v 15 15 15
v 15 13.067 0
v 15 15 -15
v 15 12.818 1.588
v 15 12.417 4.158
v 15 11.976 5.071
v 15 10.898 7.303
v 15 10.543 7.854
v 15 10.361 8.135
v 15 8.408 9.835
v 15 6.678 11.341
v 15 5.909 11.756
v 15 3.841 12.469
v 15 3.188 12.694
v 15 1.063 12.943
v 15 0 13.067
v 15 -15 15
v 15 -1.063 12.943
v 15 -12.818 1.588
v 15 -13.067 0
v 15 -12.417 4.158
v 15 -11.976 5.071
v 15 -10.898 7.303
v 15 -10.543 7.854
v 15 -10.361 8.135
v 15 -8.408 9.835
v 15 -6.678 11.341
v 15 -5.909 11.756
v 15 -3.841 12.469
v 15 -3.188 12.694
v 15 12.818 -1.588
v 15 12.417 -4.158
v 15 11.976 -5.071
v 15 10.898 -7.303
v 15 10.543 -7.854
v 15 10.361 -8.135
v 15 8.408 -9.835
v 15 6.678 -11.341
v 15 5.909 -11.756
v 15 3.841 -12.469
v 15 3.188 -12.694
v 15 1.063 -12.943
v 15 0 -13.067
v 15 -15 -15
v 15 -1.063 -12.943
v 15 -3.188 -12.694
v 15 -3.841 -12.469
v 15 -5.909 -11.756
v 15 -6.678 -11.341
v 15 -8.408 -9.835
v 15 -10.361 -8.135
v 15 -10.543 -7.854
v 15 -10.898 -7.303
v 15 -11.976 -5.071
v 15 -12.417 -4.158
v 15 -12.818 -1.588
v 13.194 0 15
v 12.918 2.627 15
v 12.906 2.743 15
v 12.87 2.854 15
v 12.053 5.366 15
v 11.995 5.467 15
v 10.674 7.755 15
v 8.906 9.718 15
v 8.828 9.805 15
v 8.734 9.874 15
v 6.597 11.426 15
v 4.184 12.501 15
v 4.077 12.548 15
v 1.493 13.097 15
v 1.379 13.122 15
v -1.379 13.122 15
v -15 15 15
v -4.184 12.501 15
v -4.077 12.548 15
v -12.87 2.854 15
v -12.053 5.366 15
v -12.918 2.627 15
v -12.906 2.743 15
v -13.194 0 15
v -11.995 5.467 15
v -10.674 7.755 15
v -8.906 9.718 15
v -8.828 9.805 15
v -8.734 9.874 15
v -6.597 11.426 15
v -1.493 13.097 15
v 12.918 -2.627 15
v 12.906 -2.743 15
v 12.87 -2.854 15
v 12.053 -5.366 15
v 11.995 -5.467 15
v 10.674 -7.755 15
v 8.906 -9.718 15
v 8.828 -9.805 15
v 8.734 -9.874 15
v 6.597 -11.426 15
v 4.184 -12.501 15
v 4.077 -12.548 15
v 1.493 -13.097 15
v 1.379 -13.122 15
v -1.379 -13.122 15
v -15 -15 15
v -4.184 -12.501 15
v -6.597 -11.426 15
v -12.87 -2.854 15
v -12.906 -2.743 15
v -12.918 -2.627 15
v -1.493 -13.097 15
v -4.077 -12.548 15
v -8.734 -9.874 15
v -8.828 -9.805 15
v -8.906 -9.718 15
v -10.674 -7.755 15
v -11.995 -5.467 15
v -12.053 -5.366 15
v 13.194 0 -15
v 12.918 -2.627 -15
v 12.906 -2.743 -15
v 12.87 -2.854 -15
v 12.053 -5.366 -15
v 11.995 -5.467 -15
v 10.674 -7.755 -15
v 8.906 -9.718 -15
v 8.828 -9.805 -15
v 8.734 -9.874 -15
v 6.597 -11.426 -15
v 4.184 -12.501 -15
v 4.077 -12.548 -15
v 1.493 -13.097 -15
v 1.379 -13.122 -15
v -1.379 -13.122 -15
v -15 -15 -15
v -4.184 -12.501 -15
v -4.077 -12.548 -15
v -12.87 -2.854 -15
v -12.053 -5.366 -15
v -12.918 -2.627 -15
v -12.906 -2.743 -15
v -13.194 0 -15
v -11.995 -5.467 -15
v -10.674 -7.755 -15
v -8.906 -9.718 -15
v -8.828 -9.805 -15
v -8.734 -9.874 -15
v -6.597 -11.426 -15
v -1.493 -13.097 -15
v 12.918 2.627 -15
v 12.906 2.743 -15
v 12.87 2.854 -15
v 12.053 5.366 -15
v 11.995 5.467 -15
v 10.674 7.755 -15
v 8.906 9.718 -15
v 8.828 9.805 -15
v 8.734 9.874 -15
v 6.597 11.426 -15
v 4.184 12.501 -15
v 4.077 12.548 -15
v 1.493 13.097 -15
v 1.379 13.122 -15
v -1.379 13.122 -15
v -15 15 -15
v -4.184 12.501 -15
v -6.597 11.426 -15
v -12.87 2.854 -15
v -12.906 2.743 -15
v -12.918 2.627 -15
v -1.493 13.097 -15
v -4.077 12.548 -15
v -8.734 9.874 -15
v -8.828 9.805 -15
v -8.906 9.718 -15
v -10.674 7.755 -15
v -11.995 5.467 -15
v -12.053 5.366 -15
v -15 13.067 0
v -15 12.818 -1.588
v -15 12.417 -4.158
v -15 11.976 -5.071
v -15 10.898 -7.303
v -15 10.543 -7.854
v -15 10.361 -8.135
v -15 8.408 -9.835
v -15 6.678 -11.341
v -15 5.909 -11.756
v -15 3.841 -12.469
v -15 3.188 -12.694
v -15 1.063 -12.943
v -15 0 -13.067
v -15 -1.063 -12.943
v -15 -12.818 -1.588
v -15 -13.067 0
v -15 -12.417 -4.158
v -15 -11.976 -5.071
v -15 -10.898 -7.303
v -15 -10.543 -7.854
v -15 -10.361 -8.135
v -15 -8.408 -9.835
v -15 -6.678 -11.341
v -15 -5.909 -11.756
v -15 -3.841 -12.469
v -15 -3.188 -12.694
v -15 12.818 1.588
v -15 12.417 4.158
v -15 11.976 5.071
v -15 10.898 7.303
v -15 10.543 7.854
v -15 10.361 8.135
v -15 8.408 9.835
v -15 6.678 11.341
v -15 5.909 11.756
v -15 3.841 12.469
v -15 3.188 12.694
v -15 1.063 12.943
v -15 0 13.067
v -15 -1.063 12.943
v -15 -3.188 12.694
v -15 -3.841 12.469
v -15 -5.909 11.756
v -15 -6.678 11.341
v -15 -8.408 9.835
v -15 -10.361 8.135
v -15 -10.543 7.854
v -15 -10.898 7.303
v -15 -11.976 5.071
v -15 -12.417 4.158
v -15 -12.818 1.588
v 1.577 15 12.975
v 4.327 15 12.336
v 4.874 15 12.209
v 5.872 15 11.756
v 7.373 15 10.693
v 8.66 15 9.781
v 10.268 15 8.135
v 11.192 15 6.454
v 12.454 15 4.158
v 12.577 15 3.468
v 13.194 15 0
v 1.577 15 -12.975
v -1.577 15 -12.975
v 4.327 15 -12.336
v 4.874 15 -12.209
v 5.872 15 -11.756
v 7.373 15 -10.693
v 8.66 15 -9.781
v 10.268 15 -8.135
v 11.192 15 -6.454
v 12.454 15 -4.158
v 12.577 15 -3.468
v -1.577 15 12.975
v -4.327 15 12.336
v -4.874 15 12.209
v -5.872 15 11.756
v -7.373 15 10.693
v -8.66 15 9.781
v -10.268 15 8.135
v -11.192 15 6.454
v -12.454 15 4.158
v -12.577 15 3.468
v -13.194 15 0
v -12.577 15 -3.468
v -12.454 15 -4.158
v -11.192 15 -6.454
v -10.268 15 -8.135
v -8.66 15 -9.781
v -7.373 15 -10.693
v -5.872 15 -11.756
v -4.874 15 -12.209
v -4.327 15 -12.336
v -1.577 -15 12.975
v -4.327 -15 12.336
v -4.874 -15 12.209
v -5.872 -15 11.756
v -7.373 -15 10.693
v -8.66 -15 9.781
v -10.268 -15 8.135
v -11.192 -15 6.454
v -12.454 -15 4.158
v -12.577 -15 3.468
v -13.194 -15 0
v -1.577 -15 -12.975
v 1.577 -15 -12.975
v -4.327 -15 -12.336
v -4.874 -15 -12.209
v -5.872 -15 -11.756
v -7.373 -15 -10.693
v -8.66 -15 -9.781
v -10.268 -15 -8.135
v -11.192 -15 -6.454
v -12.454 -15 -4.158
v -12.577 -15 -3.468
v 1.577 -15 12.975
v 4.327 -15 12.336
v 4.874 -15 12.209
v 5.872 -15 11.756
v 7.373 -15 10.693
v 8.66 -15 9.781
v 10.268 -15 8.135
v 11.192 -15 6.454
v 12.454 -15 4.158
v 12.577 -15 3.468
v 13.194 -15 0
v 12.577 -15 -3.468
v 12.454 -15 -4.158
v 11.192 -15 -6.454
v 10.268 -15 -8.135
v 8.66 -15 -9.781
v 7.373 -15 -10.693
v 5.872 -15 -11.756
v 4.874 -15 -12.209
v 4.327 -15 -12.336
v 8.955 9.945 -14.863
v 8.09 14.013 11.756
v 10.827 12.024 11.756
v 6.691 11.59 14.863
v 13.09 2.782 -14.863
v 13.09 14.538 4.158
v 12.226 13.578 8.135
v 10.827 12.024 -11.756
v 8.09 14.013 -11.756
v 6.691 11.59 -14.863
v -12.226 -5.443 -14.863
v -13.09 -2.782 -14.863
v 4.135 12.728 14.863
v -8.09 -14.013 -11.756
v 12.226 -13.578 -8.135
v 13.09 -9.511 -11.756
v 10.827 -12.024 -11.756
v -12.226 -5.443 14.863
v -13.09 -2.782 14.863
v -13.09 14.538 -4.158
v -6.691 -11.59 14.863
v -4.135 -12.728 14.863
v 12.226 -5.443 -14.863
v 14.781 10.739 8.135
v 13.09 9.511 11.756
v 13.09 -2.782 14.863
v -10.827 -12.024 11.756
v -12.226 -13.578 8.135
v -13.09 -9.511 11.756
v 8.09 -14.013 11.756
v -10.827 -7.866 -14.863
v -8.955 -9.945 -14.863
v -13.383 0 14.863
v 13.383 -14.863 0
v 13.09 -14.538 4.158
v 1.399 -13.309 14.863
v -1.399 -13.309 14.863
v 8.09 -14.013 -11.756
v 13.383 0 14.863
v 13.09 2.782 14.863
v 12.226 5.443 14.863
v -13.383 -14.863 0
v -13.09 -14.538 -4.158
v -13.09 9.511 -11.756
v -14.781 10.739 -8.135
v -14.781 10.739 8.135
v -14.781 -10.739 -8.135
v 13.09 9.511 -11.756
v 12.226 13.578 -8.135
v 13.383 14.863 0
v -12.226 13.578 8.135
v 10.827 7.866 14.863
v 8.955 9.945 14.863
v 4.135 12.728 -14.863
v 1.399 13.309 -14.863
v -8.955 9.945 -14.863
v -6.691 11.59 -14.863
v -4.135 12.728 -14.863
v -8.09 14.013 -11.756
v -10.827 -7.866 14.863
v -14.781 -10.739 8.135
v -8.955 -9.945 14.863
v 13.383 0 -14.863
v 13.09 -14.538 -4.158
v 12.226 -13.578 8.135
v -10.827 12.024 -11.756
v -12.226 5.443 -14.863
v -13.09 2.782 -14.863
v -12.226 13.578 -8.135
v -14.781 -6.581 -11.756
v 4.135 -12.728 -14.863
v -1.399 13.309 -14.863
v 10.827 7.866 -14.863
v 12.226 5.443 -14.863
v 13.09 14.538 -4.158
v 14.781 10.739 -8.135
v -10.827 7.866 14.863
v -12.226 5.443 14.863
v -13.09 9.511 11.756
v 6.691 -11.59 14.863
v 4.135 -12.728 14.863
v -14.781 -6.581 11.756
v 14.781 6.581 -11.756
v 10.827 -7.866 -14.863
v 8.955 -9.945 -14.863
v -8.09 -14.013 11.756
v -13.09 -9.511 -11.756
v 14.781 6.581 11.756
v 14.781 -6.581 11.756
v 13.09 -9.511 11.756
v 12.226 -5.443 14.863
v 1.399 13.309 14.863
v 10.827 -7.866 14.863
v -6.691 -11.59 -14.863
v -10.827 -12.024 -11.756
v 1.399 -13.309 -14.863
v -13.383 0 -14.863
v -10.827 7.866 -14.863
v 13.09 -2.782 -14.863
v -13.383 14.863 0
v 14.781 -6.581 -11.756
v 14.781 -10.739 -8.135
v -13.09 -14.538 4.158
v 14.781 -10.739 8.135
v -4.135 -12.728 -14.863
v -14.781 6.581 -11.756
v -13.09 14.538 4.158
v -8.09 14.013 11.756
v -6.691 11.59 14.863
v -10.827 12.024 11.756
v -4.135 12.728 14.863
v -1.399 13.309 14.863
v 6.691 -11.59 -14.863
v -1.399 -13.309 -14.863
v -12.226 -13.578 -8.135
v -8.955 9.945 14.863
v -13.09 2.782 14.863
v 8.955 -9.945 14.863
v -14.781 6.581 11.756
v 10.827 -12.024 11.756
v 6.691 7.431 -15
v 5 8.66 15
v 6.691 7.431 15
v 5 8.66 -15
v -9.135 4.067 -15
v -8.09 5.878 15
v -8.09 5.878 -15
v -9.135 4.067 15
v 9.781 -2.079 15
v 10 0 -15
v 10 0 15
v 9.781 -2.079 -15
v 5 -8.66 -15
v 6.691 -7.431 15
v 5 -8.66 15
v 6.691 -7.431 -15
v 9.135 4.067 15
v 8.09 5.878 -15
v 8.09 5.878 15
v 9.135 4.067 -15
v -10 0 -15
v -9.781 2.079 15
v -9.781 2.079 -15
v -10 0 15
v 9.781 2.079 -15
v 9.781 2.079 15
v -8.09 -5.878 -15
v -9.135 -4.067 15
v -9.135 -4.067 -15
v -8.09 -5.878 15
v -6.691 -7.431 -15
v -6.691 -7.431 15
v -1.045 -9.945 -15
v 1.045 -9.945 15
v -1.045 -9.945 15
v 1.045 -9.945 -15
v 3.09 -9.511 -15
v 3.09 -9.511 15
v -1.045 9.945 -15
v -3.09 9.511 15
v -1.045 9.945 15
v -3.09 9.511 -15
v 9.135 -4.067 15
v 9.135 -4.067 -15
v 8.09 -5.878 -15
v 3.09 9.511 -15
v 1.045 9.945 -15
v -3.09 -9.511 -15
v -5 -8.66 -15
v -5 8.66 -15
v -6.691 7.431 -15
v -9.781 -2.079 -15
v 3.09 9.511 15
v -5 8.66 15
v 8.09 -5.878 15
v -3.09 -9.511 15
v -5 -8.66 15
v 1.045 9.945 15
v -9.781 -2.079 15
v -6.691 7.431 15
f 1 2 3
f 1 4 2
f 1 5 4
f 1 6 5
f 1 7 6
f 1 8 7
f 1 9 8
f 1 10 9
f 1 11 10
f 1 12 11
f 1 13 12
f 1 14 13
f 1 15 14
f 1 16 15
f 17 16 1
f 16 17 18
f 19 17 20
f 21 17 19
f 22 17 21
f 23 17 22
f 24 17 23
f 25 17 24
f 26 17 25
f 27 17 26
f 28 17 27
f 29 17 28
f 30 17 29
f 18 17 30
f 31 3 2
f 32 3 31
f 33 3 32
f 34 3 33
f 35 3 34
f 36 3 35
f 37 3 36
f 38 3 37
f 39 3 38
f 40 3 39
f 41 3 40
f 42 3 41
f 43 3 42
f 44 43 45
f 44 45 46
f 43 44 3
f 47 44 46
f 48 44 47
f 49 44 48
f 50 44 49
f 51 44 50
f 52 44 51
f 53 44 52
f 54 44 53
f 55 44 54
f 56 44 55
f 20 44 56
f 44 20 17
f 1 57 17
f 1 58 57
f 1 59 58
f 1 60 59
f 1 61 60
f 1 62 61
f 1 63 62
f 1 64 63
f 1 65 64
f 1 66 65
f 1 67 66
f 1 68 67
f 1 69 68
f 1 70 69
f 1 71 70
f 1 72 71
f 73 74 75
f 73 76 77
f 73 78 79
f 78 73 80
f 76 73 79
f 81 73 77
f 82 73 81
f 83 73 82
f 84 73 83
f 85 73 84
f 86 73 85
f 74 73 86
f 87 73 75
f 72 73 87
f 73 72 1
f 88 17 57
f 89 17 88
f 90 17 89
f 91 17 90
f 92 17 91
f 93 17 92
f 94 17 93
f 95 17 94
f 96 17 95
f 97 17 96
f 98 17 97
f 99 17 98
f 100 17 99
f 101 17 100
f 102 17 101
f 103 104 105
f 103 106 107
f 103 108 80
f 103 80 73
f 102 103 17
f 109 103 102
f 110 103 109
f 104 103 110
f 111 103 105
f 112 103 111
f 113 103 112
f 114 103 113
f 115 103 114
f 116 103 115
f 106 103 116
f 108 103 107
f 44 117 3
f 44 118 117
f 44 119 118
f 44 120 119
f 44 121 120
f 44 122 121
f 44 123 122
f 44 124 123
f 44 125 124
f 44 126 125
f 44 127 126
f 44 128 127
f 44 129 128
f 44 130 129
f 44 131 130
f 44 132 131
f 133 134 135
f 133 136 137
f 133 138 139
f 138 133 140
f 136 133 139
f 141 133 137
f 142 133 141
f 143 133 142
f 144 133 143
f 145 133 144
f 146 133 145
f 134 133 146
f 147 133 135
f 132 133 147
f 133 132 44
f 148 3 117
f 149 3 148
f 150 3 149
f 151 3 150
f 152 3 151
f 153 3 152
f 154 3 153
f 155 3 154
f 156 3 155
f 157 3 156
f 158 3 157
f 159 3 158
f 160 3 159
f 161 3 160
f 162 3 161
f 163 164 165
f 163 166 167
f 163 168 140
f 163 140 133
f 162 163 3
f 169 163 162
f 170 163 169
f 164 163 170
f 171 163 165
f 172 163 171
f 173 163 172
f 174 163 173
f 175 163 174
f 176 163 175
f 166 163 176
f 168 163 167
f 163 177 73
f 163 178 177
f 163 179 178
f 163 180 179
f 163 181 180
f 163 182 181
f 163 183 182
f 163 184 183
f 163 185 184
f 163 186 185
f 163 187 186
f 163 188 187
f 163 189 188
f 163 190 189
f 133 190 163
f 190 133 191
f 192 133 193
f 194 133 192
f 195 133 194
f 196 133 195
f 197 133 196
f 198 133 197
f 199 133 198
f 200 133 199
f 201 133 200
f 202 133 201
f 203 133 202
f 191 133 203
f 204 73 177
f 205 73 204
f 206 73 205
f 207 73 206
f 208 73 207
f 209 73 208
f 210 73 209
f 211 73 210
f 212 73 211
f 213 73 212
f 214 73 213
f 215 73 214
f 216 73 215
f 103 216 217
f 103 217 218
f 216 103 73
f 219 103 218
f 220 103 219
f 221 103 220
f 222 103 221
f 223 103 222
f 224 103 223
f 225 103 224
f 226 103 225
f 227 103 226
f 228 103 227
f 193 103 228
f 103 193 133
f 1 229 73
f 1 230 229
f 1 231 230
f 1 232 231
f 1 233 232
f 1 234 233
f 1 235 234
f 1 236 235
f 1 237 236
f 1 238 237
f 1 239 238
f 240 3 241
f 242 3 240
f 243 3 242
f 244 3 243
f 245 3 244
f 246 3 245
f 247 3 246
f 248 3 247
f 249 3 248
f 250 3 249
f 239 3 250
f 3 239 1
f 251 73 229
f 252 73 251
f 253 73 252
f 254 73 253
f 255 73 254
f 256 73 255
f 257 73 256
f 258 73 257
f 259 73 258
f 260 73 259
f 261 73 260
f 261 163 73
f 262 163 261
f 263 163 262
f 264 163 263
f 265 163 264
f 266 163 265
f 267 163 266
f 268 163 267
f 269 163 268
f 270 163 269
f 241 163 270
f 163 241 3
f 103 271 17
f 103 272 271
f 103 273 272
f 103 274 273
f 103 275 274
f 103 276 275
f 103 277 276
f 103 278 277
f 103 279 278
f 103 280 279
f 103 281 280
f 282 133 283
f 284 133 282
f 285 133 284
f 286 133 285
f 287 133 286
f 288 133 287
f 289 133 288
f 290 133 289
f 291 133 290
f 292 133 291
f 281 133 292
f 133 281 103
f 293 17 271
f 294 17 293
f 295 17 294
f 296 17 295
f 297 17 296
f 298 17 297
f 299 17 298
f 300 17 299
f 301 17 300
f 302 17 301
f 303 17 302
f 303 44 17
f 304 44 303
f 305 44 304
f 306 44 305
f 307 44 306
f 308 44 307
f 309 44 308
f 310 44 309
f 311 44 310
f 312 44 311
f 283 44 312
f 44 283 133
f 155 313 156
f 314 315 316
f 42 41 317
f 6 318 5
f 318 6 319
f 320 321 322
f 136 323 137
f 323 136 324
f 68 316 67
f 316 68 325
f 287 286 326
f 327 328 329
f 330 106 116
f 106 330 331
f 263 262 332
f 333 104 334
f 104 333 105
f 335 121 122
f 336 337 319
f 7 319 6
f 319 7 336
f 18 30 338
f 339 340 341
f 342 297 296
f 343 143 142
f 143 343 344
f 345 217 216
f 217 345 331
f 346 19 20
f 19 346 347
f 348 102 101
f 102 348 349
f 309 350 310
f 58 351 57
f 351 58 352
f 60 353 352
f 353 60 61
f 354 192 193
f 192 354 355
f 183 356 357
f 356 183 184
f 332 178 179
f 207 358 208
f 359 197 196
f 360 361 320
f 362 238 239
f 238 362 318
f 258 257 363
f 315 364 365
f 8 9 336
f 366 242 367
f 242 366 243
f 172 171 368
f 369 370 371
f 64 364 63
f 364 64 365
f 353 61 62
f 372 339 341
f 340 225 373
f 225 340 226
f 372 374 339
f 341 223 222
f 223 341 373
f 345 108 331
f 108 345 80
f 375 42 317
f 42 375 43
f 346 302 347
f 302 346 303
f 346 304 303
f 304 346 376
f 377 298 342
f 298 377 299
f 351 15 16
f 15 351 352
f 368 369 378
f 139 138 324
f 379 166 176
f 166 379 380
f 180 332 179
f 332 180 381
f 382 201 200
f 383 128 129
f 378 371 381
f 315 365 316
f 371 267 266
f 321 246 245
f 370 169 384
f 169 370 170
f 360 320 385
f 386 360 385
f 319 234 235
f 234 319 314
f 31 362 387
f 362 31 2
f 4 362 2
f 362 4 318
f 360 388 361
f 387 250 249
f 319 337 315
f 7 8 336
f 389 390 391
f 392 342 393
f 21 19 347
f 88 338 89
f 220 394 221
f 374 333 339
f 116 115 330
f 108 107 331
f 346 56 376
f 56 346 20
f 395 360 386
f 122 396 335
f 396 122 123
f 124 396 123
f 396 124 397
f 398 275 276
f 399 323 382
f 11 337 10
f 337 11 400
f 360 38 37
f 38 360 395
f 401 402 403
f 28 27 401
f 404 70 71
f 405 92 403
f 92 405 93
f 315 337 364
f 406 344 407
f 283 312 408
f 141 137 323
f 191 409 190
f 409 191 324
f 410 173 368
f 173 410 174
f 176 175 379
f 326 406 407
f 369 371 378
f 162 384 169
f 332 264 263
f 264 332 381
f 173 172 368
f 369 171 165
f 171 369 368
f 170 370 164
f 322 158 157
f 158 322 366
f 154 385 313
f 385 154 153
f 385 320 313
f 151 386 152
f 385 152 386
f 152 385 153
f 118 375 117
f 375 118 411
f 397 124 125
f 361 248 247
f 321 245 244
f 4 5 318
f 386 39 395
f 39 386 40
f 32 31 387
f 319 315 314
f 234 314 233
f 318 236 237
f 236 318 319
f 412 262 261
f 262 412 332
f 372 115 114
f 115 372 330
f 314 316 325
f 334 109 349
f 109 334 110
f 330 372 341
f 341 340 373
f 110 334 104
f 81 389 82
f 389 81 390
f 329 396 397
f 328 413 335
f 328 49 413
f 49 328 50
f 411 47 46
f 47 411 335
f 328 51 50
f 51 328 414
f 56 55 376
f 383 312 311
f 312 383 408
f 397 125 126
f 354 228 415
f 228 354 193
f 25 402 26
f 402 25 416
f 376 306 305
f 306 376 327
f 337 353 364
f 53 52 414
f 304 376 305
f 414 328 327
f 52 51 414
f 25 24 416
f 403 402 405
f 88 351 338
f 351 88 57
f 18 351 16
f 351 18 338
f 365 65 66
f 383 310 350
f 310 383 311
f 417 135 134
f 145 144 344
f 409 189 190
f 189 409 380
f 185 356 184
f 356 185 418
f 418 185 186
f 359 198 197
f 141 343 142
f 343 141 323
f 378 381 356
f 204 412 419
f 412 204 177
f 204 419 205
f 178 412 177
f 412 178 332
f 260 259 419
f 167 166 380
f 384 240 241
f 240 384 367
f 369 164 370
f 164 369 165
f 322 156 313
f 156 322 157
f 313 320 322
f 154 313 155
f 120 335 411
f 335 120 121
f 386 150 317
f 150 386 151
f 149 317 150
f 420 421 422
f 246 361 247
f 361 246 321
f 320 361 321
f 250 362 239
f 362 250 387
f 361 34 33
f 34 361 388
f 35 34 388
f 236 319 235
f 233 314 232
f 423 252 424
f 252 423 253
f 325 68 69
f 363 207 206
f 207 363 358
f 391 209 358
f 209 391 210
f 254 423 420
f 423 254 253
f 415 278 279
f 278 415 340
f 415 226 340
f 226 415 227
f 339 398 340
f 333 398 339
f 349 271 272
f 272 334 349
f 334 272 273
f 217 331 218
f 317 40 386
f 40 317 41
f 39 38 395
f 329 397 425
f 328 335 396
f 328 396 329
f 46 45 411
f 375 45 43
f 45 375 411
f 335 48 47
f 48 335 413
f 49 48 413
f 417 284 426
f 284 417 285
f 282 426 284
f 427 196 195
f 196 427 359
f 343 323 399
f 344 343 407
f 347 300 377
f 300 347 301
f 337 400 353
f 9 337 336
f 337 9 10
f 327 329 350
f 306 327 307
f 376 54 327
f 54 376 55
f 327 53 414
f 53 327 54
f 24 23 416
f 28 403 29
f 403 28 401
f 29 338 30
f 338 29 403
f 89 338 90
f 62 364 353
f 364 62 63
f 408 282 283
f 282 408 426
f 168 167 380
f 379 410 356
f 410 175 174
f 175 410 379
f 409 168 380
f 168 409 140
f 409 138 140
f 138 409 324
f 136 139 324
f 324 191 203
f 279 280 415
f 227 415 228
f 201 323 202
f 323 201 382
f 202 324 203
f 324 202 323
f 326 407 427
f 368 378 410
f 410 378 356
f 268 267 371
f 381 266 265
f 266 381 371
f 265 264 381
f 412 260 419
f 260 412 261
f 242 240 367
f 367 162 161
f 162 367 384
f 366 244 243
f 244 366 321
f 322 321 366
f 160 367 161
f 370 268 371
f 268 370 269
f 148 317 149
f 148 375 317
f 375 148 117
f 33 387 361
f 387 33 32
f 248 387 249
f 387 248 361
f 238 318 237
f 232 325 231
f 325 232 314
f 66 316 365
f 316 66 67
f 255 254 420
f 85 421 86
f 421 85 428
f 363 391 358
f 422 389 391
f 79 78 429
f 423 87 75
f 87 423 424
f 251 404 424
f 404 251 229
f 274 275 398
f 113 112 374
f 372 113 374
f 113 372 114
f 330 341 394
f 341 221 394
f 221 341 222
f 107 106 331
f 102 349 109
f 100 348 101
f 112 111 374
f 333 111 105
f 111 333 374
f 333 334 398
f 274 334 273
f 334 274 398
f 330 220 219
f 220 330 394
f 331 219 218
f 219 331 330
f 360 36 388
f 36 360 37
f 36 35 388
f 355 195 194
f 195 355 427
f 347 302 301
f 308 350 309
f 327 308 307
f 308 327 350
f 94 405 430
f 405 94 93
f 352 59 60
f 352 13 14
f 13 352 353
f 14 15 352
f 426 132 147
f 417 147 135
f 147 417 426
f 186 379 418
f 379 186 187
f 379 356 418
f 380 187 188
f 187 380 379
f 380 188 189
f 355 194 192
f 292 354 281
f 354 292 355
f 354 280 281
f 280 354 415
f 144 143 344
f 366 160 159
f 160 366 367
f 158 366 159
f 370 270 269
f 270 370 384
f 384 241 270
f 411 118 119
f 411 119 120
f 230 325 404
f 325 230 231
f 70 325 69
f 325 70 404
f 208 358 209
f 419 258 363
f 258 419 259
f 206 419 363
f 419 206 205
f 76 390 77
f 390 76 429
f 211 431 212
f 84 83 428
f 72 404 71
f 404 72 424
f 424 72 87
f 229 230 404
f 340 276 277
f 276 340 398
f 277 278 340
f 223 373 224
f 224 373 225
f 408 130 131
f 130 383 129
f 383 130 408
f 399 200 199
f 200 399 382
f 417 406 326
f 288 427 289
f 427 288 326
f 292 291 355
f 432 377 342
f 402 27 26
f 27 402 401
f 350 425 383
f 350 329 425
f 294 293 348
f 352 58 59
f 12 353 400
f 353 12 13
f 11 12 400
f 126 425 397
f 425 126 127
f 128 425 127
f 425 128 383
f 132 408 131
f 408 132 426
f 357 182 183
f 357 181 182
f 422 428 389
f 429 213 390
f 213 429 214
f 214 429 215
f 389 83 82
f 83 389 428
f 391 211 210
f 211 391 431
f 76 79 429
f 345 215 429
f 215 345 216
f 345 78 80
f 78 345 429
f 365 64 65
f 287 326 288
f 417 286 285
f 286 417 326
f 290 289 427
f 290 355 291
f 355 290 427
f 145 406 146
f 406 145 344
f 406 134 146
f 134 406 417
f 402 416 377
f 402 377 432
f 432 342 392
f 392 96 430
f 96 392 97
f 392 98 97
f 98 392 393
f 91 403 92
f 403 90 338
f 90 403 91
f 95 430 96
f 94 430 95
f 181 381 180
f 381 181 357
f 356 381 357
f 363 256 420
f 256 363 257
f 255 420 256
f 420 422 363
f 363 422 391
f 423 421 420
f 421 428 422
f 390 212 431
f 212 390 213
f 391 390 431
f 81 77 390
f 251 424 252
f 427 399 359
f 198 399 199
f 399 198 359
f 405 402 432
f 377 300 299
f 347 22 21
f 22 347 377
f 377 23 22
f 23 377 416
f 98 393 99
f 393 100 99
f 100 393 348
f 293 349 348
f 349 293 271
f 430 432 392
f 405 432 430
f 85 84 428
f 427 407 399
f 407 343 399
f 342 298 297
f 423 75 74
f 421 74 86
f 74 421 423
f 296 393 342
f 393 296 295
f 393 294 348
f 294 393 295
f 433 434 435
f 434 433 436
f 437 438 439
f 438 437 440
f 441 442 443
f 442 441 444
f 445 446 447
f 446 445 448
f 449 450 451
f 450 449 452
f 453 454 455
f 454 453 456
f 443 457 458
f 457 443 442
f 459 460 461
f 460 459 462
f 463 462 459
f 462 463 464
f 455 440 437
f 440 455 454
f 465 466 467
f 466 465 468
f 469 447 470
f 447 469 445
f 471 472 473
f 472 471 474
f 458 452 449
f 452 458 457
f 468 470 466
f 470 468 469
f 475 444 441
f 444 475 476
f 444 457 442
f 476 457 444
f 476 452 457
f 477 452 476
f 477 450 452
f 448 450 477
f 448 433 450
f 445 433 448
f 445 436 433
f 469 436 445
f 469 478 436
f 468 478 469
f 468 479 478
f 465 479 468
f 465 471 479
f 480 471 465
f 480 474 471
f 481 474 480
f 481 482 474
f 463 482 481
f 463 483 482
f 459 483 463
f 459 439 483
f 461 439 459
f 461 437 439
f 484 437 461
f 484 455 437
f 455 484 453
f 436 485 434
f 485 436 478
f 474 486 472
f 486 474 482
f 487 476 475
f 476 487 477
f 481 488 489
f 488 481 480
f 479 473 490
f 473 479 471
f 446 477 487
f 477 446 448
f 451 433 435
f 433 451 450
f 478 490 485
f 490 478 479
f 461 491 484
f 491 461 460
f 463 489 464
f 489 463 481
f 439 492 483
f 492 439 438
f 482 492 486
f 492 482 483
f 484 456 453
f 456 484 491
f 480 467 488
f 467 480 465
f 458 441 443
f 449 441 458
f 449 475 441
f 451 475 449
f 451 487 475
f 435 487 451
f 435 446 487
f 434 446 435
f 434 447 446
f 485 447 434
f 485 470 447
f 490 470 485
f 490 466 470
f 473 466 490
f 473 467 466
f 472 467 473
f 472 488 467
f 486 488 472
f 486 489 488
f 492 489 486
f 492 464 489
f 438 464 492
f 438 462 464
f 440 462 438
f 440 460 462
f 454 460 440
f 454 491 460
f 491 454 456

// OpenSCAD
/* ****** ****** */
/*
Let's draw a bit more
*/
/* ****** ****** */

difference()
{
  cube(30, center=true);
  sphere(20);
}

translate([0, 0, -15])
{
  cylinder(h=30, r=10);
}

/* ****** ****** */

/* end of [test02.scad] */
